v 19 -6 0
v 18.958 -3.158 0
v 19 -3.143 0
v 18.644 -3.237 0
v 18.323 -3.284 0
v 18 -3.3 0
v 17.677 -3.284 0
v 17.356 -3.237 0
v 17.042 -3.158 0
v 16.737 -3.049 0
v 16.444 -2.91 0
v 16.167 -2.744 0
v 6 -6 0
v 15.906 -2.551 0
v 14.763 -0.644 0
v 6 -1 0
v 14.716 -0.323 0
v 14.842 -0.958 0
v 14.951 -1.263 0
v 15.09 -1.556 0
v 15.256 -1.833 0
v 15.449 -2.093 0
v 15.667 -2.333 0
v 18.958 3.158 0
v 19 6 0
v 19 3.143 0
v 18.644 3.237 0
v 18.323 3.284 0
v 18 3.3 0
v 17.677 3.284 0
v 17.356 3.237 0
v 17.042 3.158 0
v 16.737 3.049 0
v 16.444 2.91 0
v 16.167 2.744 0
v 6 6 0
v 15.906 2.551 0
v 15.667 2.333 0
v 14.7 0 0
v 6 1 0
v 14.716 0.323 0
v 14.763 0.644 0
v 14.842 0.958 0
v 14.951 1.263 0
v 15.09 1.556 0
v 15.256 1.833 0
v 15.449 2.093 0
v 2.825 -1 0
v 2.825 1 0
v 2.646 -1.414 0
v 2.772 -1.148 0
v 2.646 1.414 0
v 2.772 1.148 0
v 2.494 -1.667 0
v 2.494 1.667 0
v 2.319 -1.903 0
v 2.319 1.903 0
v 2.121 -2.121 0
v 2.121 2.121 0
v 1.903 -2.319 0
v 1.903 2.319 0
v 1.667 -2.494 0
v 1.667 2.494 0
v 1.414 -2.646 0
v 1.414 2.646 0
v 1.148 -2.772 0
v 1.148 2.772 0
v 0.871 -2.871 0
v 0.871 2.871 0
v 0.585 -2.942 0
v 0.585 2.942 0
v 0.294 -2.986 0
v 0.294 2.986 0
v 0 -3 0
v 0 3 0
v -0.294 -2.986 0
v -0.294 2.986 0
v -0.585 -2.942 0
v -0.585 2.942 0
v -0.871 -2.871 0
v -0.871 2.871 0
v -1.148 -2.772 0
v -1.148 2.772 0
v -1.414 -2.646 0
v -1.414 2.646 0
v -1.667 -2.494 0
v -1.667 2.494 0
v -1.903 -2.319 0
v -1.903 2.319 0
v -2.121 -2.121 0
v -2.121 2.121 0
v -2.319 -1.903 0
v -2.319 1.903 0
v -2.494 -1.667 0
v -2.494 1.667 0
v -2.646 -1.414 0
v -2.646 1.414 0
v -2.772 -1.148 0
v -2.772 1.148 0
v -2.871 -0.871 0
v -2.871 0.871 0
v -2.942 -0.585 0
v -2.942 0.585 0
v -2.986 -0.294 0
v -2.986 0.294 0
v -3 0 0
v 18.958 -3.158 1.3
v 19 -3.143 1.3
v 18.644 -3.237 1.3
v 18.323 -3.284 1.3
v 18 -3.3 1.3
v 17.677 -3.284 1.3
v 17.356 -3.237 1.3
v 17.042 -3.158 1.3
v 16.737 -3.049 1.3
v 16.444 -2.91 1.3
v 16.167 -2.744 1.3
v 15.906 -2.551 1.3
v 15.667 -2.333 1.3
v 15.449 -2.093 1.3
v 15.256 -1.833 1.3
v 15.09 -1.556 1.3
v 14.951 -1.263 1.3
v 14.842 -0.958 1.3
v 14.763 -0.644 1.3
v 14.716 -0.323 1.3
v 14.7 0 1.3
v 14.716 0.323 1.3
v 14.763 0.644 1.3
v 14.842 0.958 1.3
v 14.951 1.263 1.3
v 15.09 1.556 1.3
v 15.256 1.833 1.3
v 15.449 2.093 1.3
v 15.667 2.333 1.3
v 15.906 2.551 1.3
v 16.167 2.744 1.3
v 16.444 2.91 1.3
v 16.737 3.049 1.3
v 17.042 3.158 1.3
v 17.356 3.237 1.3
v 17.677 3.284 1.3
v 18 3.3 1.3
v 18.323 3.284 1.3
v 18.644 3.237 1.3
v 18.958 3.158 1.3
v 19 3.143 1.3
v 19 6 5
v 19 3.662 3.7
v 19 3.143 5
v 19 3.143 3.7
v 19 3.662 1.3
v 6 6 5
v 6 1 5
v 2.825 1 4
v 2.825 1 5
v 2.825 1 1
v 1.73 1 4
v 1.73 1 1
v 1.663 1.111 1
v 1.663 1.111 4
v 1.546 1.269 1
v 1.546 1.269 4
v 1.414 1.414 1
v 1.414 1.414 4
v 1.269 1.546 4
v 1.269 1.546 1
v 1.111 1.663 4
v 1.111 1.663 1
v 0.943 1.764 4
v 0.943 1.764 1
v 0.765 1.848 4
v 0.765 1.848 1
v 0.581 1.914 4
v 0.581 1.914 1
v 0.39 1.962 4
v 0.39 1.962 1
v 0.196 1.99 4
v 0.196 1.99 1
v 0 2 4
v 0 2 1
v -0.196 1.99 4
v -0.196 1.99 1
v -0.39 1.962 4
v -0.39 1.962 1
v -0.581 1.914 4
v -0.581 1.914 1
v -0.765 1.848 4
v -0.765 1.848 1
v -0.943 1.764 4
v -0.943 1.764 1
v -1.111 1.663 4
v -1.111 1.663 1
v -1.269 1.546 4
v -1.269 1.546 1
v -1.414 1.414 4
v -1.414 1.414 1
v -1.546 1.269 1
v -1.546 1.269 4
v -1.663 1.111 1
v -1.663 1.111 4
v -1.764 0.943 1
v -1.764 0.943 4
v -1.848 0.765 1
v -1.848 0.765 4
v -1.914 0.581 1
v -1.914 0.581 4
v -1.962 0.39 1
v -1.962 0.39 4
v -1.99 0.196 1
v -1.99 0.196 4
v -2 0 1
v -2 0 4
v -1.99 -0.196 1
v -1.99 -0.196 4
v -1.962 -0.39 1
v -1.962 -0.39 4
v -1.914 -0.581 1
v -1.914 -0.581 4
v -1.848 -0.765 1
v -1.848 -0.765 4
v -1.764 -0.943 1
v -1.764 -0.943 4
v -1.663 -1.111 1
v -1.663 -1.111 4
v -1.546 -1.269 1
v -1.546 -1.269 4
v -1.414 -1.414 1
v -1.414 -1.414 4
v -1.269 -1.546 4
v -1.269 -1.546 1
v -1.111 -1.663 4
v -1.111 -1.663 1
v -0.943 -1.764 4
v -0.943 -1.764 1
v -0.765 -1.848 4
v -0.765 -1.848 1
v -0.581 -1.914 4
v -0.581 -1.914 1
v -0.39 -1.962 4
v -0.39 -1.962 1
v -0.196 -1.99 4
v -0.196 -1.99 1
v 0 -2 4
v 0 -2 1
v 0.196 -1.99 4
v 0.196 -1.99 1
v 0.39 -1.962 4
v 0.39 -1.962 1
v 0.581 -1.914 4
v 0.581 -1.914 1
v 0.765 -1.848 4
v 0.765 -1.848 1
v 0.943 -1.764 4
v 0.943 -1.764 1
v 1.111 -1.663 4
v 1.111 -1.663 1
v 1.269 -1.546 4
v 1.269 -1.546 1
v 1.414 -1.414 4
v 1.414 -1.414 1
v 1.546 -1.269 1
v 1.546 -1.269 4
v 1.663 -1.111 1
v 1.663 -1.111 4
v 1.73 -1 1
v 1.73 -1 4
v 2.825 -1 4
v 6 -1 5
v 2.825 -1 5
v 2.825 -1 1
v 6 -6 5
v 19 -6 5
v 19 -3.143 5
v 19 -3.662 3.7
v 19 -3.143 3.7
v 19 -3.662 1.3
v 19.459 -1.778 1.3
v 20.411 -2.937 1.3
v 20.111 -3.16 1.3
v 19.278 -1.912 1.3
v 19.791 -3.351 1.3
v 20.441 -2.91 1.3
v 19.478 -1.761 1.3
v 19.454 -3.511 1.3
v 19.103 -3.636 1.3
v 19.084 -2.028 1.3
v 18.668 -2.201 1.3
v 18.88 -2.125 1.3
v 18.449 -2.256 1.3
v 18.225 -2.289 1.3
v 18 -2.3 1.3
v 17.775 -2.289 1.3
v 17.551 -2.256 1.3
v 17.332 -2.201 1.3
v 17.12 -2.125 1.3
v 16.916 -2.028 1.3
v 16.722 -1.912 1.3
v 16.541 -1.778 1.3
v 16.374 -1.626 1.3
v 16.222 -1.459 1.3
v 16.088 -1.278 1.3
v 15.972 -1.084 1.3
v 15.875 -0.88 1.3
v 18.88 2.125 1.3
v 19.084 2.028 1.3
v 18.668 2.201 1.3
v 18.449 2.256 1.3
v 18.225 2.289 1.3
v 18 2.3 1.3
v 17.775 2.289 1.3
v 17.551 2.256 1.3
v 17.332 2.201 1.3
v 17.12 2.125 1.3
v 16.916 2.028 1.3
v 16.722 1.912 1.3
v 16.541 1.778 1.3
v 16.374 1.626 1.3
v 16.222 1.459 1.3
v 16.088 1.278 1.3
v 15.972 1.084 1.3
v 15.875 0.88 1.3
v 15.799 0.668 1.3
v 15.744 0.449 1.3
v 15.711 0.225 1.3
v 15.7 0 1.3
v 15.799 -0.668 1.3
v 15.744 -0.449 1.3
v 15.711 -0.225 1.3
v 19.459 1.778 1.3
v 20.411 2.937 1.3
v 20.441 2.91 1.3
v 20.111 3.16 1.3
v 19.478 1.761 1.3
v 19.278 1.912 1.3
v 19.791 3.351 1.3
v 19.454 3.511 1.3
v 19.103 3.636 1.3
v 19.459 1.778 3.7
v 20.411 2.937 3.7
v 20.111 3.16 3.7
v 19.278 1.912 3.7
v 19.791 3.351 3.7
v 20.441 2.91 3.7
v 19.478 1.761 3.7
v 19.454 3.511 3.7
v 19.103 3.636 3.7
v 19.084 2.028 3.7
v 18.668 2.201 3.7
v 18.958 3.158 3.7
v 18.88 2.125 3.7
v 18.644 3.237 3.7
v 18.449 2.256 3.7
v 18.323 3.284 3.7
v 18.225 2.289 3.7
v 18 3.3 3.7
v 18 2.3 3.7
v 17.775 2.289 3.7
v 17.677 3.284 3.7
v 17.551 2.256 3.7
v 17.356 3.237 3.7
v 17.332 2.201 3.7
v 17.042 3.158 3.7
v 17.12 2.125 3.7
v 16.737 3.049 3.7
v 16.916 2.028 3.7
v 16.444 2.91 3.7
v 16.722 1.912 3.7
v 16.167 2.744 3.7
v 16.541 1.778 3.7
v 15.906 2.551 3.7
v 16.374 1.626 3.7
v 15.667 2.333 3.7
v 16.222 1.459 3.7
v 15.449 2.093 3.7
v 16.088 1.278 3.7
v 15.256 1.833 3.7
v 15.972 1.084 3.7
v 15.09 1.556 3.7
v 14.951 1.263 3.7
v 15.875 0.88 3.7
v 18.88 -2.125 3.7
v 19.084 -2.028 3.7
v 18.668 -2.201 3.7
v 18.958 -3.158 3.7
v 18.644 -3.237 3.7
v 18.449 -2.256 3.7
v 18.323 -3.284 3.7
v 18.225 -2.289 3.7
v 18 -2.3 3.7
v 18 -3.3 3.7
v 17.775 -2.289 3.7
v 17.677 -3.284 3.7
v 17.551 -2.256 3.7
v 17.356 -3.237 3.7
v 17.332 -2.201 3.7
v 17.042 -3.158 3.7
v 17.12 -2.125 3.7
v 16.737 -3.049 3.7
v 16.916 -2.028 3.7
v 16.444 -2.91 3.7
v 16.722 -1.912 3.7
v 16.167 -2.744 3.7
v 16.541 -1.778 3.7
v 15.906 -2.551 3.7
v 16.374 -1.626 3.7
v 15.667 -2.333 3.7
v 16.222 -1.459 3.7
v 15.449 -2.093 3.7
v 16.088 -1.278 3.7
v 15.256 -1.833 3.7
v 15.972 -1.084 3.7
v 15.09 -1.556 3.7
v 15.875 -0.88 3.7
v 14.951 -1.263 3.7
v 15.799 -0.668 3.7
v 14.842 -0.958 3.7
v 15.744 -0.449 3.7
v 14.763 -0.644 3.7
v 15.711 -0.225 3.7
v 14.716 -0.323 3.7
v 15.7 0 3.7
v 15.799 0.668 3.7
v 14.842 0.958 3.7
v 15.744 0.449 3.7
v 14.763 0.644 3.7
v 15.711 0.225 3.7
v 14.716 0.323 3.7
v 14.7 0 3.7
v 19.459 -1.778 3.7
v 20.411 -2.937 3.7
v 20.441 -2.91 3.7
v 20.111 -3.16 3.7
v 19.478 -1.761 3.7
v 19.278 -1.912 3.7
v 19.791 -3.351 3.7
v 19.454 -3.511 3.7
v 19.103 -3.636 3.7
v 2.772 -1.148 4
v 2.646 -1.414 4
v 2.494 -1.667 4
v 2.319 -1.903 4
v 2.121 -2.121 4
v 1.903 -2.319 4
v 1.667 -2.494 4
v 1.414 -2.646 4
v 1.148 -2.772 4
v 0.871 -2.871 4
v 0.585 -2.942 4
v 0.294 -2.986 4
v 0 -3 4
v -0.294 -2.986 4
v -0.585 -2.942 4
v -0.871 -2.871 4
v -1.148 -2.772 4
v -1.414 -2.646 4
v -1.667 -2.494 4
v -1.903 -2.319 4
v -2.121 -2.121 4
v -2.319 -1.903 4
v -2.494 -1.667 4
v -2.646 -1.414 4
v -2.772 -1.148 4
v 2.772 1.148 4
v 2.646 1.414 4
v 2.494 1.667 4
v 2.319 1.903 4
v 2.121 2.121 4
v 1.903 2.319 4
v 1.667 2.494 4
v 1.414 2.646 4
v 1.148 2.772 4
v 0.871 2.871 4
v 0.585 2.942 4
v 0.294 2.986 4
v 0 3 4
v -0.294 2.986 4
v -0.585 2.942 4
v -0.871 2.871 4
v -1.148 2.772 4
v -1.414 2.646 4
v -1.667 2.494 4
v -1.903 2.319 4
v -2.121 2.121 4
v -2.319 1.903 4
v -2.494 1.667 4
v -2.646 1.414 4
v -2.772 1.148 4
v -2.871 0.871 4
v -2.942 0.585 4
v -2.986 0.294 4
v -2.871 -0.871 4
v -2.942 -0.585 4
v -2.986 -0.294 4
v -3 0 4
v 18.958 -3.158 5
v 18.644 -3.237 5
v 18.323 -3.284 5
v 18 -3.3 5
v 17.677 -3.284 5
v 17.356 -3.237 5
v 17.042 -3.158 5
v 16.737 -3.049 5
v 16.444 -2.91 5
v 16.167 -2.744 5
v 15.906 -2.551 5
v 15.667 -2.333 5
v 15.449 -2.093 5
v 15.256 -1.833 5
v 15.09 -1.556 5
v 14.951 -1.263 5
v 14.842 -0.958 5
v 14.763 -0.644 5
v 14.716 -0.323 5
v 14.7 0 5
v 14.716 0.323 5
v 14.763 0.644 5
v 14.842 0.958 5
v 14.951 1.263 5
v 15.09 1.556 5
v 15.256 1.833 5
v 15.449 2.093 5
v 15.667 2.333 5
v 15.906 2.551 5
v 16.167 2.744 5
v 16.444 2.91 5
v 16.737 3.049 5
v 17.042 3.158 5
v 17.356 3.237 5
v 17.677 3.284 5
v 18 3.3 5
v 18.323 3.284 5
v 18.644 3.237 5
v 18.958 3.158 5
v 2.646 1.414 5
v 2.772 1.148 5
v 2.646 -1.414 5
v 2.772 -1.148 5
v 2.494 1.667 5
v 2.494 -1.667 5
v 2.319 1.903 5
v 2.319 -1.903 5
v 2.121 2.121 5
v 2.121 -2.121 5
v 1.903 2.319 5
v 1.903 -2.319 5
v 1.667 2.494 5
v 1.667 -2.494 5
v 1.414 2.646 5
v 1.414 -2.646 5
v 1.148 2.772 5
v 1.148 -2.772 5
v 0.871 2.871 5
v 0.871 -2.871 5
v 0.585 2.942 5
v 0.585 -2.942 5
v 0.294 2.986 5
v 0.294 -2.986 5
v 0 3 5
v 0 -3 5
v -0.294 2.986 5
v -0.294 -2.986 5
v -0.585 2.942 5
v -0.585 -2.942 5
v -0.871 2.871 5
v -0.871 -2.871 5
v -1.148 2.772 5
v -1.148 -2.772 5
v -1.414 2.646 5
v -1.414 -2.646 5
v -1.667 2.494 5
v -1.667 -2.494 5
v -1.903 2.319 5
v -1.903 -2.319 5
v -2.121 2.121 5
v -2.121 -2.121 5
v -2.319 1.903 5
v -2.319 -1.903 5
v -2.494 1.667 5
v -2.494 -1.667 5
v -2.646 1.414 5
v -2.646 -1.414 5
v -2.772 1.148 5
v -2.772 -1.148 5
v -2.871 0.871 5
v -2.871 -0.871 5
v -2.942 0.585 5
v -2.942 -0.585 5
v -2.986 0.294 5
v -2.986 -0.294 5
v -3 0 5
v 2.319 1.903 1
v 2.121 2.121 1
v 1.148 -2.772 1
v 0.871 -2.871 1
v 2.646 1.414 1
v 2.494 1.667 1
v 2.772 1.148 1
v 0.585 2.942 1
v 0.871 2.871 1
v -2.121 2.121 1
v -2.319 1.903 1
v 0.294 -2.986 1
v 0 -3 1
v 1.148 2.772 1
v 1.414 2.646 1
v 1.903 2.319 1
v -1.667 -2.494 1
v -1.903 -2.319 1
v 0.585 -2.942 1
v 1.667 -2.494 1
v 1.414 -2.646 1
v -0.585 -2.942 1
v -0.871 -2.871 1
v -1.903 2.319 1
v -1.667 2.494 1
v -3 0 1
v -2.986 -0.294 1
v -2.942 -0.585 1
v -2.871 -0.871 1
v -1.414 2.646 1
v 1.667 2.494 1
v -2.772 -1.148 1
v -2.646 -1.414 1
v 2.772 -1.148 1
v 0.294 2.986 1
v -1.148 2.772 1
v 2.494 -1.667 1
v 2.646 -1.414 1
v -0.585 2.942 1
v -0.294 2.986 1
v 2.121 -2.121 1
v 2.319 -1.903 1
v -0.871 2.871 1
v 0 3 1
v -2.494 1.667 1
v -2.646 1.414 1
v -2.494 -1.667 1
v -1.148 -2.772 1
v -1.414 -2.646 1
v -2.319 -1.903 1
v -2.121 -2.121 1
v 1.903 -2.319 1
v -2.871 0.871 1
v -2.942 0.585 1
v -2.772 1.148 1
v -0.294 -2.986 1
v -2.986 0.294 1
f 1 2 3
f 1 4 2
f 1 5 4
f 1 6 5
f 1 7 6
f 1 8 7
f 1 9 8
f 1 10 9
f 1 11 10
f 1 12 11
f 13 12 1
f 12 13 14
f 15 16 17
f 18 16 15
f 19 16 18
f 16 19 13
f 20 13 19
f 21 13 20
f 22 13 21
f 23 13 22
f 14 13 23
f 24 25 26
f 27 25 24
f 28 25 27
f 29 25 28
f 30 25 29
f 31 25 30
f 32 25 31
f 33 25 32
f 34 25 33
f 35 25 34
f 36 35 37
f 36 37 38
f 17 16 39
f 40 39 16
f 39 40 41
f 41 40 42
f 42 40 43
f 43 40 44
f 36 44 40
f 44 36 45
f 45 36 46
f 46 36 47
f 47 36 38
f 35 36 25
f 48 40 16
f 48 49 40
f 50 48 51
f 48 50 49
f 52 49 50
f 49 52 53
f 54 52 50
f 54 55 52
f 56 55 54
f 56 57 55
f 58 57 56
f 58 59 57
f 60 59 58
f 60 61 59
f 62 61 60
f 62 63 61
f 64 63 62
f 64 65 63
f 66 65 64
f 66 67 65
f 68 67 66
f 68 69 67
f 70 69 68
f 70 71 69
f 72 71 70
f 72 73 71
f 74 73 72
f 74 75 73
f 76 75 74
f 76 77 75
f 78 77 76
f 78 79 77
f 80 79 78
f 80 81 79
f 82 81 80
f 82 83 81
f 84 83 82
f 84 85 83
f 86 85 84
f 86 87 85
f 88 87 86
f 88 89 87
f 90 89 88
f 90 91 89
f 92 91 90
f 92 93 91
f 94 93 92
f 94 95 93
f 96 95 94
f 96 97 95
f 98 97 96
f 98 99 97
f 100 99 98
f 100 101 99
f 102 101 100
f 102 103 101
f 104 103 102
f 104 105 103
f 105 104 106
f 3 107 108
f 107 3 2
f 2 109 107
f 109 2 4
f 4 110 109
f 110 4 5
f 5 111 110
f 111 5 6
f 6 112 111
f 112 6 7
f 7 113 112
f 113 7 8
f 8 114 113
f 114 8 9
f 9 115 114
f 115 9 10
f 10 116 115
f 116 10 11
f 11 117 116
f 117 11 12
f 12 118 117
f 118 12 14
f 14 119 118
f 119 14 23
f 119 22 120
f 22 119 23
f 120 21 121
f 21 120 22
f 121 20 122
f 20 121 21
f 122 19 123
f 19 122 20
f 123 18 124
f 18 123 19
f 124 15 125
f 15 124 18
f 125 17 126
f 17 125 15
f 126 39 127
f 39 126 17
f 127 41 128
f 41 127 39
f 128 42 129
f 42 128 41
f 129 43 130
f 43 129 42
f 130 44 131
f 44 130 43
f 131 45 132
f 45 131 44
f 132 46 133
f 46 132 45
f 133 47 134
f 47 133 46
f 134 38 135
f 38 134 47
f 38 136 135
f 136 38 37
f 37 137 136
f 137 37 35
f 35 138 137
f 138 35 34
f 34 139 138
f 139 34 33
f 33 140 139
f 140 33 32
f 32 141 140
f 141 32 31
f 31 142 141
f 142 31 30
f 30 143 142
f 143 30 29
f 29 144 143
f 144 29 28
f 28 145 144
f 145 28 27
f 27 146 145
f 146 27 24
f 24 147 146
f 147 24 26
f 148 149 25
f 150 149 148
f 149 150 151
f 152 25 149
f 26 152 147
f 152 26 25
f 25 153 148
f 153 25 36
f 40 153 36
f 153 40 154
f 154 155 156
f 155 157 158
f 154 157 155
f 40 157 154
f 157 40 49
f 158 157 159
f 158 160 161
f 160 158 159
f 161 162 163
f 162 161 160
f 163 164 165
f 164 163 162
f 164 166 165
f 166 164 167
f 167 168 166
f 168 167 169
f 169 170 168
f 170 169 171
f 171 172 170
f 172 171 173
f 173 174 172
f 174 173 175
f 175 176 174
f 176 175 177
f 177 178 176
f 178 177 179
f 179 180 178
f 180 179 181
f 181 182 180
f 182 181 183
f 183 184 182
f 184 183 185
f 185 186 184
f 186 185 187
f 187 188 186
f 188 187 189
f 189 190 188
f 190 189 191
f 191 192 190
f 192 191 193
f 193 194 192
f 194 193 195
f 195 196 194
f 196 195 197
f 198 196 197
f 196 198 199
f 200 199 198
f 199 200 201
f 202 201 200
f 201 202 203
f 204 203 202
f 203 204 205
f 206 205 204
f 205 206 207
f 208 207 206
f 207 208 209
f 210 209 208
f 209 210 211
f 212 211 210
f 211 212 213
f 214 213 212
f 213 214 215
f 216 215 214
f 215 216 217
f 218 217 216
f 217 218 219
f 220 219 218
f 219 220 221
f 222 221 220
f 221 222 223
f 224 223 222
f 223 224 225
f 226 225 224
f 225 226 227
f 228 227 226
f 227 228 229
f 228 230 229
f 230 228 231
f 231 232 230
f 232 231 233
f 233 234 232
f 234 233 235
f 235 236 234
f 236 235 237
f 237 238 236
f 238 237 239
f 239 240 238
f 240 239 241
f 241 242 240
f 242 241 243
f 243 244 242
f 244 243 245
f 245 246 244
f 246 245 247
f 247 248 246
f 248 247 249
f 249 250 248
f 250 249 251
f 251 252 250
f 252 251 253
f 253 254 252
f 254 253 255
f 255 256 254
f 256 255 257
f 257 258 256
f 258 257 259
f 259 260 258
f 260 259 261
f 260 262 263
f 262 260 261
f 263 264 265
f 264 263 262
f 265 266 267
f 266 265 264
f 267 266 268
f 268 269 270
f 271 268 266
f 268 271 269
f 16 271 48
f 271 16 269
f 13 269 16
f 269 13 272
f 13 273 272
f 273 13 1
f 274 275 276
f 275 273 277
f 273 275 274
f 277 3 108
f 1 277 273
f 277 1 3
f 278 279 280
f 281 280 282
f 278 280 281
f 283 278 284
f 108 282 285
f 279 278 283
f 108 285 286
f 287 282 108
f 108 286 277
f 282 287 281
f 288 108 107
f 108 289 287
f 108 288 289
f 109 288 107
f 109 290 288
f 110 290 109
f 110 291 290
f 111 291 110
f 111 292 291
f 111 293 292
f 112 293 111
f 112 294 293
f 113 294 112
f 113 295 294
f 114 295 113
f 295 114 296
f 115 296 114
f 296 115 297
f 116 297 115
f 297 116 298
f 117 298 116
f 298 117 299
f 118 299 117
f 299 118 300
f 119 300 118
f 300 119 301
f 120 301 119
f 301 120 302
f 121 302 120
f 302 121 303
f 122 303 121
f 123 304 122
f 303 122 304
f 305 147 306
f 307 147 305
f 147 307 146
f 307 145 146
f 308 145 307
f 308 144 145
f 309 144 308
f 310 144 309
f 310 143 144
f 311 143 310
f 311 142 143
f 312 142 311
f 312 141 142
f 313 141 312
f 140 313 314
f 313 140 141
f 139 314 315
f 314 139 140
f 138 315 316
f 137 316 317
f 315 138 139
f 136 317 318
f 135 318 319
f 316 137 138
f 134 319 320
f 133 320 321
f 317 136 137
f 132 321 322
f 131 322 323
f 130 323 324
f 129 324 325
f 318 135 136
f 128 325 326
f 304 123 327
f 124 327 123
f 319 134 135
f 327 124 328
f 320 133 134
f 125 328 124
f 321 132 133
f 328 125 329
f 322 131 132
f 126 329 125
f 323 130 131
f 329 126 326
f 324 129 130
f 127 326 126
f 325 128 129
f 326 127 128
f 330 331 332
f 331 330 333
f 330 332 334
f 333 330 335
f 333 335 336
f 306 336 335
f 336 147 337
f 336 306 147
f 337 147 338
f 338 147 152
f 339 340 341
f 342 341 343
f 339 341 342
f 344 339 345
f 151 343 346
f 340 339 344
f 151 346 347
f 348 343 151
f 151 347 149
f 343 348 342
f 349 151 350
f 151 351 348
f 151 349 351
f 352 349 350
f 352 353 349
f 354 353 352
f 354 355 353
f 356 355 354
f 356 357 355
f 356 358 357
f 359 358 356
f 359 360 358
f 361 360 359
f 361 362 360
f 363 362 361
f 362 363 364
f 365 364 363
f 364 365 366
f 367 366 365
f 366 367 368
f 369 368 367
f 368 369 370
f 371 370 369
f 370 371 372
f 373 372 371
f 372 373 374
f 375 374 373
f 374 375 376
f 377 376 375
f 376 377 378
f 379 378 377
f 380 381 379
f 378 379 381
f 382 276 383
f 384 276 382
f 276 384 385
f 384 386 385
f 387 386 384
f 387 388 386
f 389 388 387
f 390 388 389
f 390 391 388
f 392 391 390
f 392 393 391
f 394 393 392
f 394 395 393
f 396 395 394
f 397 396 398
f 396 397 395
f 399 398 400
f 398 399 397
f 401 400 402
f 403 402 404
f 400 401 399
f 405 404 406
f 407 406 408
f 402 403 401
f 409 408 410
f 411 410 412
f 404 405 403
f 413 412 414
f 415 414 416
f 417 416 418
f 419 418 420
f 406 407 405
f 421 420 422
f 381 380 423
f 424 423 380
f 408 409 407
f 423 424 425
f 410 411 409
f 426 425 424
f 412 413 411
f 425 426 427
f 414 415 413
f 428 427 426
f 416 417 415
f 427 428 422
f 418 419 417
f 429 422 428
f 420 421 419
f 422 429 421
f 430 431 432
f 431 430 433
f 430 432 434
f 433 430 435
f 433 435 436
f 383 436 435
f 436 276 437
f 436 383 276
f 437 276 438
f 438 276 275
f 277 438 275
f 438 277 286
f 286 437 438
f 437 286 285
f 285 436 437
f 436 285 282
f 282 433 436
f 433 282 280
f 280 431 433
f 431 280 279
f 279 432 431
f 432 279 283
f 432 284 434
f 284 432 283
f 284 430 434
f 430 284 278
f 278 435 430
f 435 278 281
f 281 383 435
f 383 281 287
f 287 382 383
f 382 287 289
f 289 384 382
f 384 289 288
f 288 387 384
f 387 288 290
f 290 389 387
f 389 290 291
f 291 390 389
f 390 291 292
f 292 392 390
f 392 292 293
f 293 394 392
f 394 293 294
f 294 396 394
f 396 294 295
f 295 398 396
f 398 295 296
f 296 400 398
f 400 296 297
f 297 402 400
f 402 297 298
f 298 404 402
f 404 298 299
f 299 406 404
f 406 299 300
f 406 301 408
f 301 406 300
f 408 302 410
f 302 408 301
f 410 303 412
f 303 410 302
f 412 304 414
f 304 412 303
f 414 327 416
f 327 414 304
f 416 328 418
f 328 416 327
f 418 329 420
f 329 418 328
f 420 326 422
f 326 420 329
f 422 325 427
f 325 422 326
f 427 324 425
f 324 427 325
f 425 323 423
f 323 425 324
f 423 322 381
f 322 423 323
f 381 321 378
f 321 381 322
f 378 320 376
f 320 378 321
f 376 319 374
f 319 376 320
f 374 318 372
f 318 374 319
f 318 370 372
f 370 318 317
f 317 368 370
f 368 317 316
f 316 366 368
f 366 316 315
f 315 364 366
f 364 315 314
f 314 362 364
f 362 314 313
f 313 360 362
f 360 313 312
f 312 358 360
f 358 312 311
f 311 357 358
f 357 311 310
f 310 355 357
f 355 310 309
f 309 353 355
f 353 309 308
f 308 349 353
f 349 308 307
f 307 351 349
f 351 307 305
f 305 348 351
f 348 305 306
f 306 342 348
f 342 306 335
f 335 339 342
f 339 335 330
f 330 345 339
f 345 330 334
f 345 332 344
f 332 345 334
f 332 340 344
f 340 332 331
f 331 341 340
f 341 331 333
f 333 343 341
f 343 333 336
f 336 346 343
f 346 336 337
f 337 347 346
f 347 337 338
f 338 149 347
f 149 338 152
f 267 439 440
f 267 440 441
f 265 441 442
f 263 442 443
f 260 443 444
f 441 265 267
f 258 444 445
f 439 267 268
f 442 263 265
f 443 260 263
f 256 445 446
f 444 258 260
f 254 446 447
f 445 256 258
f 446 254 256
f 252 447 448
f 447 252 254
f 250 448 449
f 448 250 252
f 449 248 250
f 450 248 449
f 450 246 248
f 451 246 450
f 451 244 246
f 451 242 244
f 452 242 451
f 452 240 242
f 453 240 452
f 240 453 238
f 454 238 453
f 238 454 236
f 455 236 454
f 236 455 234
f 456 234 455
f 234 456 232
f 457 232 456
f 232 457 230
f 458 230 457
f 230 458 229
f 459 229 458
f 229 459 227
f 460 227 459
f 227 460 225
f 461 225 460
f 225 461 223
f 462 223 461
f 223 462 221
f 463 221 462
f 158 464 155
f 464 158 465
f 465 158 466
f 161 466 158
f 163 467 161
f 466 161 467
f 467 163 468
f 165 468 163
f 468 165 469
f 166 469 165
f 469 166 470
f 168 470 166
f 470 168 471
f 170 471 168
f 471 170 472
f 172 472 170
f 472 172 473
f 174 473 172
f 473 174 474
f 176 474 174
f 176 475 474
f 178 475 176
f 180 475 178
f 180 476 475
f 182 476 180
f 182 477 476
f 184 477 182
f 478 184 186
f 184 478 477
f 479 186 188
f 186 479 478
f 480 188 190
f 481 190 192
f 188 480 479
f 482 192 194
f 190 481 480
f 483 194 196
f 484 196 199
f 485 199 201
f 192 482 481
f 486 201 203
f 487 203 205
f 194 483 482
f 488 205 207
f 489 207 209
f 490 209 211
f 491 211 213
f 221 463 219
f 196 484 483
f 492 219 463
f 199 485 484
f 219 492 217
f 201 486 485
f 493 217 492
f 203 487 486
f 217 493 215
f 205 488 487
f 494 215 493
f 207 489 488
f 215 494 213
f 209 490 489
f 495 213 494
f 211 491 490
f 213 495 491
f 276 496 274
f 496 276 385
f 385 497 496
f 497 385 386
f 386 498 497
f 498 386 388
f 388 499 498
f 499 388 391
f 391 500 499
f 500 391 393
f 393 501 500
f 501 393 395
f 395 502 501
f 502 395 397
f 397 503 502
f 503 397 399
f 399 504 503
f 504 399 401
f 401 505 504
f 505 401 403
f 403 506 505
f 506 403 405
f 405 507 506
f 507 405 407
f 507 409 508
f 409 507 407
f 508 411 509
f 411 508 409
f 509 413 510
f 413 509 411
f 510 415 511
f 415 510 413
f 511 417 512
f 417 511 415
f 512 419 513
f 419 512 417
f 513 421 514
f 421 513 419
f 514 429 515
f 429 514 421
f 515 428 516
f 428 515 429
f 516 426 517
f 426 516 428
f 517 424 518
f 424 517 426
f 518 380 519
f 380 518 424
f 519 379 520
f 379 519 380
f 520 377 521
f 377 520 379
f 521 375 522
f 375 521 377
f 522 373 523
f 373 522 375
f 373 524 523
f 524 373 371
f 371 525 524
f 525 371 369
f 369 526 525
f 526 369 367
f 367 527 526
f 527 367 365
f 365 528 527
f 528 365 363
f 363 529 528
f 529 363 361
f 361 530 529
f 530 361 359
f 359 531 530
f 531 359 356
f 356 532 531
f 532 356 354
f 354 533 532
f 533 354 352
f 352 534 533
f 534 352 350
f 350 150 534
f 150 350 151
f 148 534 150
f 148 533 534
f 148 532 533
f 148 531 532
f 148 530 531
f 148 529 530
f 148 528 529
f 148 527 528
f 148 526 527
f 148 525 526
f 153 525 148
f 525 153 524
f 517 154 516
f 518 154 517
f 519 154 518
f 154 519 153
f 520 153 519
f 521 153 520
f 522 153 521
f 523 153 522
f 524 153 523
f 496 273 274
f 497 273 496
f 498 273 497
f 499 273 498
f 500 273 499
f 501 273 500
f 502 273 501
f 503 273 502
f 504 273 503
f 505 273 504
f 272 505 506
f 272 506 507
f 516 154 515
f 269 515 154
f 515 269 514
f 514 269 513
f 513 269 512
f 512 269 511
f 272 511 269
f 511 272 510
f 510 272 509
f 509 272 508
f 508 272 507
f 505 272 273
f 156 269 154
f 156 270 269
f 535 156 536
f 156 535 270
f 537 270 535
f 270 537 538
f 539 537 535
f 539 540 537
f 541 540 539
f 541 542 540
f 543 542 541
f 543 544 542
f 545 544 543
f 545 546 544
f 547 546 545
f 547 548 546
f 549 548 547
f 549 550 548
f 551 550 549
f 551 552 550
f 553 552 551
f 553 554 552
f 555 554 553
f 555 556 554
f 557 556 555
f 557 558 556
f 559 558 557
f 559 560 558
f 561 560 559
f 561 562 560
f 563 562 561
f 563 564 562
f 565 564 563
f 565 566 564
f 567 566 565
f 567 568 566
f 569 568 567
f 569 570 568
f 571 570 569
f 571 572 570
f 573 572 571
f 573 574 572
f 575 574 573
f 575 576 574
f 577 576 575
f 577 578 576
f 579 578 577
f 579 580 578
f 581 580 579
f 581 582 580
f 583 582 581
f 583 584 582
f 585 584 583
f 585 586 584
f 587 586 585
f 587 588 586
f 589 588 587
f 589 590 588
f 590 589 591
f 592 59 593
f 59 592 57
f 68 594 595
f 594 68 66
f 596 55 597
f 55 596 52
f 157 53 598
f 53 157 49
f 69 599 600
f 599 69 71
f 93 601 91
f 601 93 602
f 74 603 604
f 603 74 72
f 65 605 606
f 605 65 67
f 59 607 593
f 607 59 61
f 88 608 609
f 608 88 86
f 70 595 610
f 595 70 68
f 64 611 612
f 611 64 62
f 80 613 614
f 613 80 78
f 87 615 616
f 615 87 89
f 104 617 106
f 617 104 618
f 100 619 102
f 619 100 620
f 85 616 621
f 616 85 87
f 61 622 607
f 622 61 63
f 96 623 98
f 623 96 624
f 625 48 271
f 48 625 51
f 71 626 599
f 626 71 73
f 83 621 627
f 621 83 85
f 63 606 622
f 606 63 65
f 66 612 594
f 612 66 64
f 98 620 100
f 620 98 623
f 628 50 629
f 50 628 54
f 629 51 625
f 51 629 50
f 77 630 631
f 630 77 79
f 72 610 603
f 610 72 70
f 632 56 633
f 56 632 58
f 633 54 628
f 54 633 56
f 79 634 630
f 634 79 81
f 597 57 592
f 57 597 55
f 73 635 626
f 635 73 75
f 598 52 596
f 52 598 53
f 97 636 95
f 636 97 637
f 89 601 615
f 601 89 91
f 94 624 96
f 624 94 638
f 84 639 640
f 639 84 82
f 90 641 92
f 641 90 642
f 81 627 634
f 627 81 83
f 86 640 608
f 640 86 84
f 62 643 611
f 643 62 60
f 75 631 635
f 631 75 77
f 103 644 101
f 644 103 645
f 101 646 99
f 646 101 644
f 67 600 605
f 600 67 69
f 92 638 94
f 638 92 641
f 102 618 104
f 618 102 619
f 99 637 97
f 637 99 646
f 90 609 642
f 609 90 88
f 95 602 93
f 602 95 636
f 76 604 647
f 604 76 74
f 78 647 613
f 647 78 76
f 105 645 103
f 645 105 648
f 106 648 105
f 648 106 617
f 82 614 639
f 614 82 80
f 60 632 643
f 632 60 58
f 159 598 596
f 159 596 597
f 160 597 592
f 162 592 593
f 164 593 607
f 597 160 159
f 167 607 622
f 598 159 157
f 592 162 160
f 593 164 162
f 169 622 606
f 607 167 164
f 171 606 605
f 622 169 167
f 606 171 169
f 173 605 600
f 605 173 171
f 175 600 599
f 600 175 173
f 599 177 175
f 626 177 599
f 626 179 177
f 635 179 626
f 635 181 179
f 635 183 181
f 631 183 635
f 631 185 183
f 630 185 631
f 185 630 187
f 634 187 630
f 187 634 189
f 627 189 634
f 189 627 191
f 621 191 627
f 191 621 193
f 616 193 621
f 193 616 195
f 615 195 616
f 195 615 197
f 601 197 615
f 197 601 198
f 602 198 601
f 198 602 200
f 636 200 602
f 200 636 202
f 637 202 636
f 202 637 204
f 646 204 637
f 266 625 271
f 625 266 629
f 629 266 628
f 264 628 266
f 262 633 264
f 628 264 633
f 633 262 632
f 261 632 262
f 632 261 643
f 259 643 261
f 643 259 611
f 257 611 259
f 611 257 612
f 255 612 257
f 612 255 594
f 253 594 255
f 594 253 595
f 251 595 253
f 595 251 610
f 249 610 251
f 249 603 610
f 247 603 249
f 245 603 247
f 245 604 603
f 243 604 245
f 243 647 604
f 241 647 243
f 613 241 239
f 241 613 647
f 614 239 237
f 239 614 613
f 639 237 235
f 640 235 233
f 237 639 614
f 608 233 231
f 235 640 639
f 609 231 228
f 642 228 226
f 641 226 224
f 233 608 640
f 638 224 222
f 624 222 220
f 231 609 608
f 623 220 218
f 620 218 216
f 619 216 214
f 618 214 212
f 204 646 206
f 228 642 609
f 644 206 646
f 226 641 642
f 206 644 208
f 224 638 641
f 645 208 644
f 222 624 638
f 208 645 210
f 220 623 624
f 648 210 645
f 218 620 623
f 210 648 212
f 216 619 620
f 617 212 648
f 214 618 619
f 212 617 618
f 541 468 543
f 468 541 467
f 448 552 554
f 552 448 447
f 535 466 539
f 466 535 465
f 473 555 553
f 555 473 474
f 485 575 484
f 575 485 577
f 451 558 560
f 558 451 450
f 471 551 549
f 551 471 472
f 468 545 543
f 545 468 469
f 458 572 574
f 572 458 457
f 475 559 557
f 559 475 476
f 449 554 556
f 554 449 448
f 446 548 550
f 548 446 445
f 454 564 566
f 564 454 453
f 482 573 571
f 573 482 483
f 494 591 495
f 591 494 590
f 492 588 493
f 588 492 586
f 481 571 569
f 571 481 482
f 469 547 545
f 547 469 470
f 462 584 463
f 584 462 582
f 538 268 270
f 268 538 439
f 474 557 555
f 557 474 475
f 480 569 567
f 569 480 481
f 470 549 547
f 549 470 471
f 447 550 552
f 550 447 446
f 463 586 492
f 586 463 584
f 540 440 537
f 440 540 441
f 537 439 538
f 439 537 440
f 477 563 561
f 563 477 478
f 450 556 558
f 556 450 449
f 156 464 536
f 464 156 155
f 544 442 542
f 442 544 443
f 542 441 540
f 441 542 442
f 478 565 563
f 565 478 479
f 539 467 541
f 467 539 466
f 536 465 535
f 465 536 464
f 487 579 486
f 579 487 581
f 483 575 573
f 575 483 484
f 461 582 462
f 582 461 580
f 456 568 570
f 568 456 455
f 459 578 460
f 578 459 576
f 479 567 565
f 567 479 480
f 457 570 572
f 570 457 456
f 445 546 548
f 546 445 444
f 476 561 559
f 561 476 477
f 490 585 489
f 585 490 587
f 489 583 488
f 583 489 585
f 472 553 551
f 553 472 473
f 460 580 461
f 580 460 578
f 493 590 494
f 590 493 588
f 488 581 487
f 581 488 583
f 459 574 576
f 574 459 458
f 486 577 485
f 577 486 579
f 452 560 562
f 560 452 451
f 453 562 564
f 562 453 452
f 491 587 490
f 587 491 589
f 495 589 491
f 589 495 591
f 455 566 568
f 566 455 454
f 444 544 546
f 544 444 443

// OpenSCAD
part = "link"; // [link, assembly]
cadverify_only = "";
module instance(name, part, unit = 1) {
    echo(cadverify_instance = [name, part, unit]);
    if (cadverify_only == "" || cadverify_only == name) children();
}

// Parameters (mm)
pitch = 18;          // pin-to-bore distance (10 links = 180mm)
link_w = 12;         // width (Y)
link_t = 5;          // thickness (Z)
pin_d = 4;           // pin shaft diameter
bore_d = 4.6;        // bore diameter (0.3 radial clearance)
cap_d = 6;           // cap diameter
cap_h = 1;           // cap thickness
gap_z = 0.3;         // vertical clearance cap<->knuckle
kn_out_d = 7.6;      // knuckle outer diameter (1.5 wall)
cap_cav_d = 6.6;     // cap cavity diameter (0.3 radial clearance)
neck_w = 2;          // neck width
slot_half = 50;      // slot half-angle (deg), allows +-30 deg swing
yoke_west = 6;       // yoke west edge (local X)
yoke_east = 19;      // yoke east extent (local X, 1.0 past bore)
$fn = 64;

module link_geom() {
    bore_x = pitch;
    pin_r = pin_d/2;
    bore_r = bore_d/2;
    kn_out_r = kn_out_d/2;
    cav_r = cap_cav_d/2;
    cap_r = cap_d/2;
    wedge_far = 30;
    dy_far = wedge_far * tan(slot_half);
    bot_h = cap_h;            // 0..1
    gap_h = gap_z;            // 0.3
    kn_h = link_t - 2*cap_h - 2*gap_h; // 2.4 (1.3..3.7)
    // bottom (0..1): pin+neck+yoke minus cap cavity minus slot
    translate([0,0,0]) linear_extrude(height = bot_h, convexity = 8) {
        difference() {
            union() {
                circle(r = pin_r);
                translate([0,-neck_w/2]) square([yoke_west+1, neck_w]);
                translate([yoke_west,-link_w/2]) square([yoke_east-yoke_west, link_w]);
            }
            translate([bore_x,0]) circle(r = cav_r);
            polygon(points = [[bore_x,0],[bore_x+wedge_far, dy_far],[bore_x+wedge_far, -dy_far]]);
        }
    }
    // lower gap (1..1.3): same footprint
    translate([0,0,bot_h]) linear_extrude(height = gap_h, convexity = 8) {
        difference() {
            union() {
                circle(r = pin_r);
                translate([0,-neck_w/2]) square([yoke_west+1, neck_w]);
                translate([yoke_west,-link_w/2]) square([yoke_east-yoke_west, link_w]);
            }
            translate([bore_x,0]) circle(r = cav_r);
            polygon(points = [[bore_x,0],[bore_x+wedge_far, dy_far],[bore_x+wedge_far, -dy_far]]);
        }
    }
    // middle knuckle zone (1.3..3.7)
    translate([0,0,bot_h+gap_h]) linear_extrude(height = kn_h, convexity = 8) {
        difference() {
            union() {
                circle(r = pin_r);
                translate([0,-neck_w/2]) square([yoke_west+1, neck_w]);
                translate([yoke_west,-link_w/2]) square([yoke_east-yoke_west, link_w]);
                translate([bore_x,0]) circle(r = kn_out_r);
            }
            translate([bore_x,0]) circle(r = bore_r);
            polygon(points = [[bore_x,0],[bore_x+wedge_far, dy_far],[bore_x+wedge_far, -dy_far]]);
        }
    }
    // upper gap (3.7..4)
    translate([0,0,bot_h+gap_h+kn_h]) linear_extrude(height = gap_h, convexity = 8) {
        difference() {
            union() {
                circle(r = pin_r);
                translate([0,-neck_w/2]) square([yoke_west+1, neck_w]);
                translate([yoke_west,-link_w/2]) square([yoke_east-yoke_west, link_w]);
            }
            translate([bore_x,0]) circle(r = cav_r);
            polygon(points = [[bore_x,0],[bore_x+wedge_far, dy_far],[bore_x+wedge_far, -dy_far]]);
        }
    }
    // top (4..5)
    translate([0,0,bot_h+gap_h+kn_h+gap_h]) linear_extrude(height = bot_h, convexity = 8) {
        difference() {
            union() {
                circle(r = pin_r);
                translate([0,-neck_w/2]) square([yoke_west+1, neck_w]);
                translate([yoke_west,-link_w/2]) square([yoke_east-yoke_west, link_w]);
            }
            translate([bore_x,0]) circle(r = cav_r);
            polygon(points = [[bore_x,0],[bore_x+wedge_far, dy_far],[bore_x+wedge_far, -dy_far]]);
        }
    }
    // caps (pin ends)
    translate([0,0,0]) cylinder(h = cap_h, r = cap_r);
    translate([0,0,link_t-cap_h]) cylinder(h = cap_h, r = cap_r);
}

if (part == "assembly") {
    instance("link1", "link", 1) translate([0,0,0]) link_geom();
    instance("link2", "link", 1) translate([18,0,0]) link_geom();
    instance("link3", "link", 1) translate([36,0,0]) link_geom();
    echo(cadverify_spec = [
        ["bounds", [[-3, -6, 0], [56.5, 6, 5]]],
        ["support_faces", [["bed", "-z", 200]]],
        ["motions", [
            ["bend", ["link3"], "rotate", [36, 0, 0], [0, 0, 1], [-30, 30]]
        ]],
        ["assembly_order", [
            [["link1", "link2", "link3"], [0, 0, 0]]
        ]],
        ["print_in_place", 0.3],
        ["overhangs_allowed", [
            ["pin cap link1", [[-3, -3, 3.8], [3, 3, 4.2]]],
            ["knuckle joint1", [[14, -4, 1.0], [22, 4, 1.6]]],
            ["pin cap link2", [[15, -3, 3.8], [21, 3, 4.2]]],
            ["knuckle joint2", [[32, -4, 1.0], [40, 4, 1.6]]],
            ["pin cap link3", [[33, -3, 3.8], [39, 3, 4.2]]],
            ["knuckle end", [[50, -4, 1.0], [58, 4, 1.6]]]
        ]],
        ["held", ["link1", "link2", "link3"]]
    ]);
} else {
    link_geom();
    echo(cadverify_spec = [
        ["bounds", [[-3, -6, 0], [20.5, 6, 5]]],
        ["bodies", 1],
        ["through_holes", 0],
        ["support_faces", [["bed", "-z", 100]]],
        ["overhangs_allowed", [
            ["pin cap", [[-3, -3, 3.8], [3, 3, 4.2]]],
            ["knuckle ceiling", [[14, -4, 1.0], [22, 4, 1.6]]]
        ]],
        ["copies", 3],
        ["details", [
            ["body", "material", [[6, -6, 0], [14, 6, 5]], 0.85],
            ["neck", "material", [[0, -1, 0], [7, 1, 5]], 0.8],
            ["knuckle", "material", [[14.2, -3.8, 1.3], [21.8, 3.8, 3.7]], 0.25],
            ["slot", "void", [[19, -1, 0], [21, 1, 5]], 0.8],
            ["cap_cavity", "void", [[14.7, -3.3, 0], [21.3, 3.3, 1]], 0.5],
            ["wall", "thickness", [18, 7, 2.5], [0, -1, 0], 3.7],
            ["floor", "thickness", [9, 0, -1], [0, 0, 1], 5]
        ]]
    ]);
}
